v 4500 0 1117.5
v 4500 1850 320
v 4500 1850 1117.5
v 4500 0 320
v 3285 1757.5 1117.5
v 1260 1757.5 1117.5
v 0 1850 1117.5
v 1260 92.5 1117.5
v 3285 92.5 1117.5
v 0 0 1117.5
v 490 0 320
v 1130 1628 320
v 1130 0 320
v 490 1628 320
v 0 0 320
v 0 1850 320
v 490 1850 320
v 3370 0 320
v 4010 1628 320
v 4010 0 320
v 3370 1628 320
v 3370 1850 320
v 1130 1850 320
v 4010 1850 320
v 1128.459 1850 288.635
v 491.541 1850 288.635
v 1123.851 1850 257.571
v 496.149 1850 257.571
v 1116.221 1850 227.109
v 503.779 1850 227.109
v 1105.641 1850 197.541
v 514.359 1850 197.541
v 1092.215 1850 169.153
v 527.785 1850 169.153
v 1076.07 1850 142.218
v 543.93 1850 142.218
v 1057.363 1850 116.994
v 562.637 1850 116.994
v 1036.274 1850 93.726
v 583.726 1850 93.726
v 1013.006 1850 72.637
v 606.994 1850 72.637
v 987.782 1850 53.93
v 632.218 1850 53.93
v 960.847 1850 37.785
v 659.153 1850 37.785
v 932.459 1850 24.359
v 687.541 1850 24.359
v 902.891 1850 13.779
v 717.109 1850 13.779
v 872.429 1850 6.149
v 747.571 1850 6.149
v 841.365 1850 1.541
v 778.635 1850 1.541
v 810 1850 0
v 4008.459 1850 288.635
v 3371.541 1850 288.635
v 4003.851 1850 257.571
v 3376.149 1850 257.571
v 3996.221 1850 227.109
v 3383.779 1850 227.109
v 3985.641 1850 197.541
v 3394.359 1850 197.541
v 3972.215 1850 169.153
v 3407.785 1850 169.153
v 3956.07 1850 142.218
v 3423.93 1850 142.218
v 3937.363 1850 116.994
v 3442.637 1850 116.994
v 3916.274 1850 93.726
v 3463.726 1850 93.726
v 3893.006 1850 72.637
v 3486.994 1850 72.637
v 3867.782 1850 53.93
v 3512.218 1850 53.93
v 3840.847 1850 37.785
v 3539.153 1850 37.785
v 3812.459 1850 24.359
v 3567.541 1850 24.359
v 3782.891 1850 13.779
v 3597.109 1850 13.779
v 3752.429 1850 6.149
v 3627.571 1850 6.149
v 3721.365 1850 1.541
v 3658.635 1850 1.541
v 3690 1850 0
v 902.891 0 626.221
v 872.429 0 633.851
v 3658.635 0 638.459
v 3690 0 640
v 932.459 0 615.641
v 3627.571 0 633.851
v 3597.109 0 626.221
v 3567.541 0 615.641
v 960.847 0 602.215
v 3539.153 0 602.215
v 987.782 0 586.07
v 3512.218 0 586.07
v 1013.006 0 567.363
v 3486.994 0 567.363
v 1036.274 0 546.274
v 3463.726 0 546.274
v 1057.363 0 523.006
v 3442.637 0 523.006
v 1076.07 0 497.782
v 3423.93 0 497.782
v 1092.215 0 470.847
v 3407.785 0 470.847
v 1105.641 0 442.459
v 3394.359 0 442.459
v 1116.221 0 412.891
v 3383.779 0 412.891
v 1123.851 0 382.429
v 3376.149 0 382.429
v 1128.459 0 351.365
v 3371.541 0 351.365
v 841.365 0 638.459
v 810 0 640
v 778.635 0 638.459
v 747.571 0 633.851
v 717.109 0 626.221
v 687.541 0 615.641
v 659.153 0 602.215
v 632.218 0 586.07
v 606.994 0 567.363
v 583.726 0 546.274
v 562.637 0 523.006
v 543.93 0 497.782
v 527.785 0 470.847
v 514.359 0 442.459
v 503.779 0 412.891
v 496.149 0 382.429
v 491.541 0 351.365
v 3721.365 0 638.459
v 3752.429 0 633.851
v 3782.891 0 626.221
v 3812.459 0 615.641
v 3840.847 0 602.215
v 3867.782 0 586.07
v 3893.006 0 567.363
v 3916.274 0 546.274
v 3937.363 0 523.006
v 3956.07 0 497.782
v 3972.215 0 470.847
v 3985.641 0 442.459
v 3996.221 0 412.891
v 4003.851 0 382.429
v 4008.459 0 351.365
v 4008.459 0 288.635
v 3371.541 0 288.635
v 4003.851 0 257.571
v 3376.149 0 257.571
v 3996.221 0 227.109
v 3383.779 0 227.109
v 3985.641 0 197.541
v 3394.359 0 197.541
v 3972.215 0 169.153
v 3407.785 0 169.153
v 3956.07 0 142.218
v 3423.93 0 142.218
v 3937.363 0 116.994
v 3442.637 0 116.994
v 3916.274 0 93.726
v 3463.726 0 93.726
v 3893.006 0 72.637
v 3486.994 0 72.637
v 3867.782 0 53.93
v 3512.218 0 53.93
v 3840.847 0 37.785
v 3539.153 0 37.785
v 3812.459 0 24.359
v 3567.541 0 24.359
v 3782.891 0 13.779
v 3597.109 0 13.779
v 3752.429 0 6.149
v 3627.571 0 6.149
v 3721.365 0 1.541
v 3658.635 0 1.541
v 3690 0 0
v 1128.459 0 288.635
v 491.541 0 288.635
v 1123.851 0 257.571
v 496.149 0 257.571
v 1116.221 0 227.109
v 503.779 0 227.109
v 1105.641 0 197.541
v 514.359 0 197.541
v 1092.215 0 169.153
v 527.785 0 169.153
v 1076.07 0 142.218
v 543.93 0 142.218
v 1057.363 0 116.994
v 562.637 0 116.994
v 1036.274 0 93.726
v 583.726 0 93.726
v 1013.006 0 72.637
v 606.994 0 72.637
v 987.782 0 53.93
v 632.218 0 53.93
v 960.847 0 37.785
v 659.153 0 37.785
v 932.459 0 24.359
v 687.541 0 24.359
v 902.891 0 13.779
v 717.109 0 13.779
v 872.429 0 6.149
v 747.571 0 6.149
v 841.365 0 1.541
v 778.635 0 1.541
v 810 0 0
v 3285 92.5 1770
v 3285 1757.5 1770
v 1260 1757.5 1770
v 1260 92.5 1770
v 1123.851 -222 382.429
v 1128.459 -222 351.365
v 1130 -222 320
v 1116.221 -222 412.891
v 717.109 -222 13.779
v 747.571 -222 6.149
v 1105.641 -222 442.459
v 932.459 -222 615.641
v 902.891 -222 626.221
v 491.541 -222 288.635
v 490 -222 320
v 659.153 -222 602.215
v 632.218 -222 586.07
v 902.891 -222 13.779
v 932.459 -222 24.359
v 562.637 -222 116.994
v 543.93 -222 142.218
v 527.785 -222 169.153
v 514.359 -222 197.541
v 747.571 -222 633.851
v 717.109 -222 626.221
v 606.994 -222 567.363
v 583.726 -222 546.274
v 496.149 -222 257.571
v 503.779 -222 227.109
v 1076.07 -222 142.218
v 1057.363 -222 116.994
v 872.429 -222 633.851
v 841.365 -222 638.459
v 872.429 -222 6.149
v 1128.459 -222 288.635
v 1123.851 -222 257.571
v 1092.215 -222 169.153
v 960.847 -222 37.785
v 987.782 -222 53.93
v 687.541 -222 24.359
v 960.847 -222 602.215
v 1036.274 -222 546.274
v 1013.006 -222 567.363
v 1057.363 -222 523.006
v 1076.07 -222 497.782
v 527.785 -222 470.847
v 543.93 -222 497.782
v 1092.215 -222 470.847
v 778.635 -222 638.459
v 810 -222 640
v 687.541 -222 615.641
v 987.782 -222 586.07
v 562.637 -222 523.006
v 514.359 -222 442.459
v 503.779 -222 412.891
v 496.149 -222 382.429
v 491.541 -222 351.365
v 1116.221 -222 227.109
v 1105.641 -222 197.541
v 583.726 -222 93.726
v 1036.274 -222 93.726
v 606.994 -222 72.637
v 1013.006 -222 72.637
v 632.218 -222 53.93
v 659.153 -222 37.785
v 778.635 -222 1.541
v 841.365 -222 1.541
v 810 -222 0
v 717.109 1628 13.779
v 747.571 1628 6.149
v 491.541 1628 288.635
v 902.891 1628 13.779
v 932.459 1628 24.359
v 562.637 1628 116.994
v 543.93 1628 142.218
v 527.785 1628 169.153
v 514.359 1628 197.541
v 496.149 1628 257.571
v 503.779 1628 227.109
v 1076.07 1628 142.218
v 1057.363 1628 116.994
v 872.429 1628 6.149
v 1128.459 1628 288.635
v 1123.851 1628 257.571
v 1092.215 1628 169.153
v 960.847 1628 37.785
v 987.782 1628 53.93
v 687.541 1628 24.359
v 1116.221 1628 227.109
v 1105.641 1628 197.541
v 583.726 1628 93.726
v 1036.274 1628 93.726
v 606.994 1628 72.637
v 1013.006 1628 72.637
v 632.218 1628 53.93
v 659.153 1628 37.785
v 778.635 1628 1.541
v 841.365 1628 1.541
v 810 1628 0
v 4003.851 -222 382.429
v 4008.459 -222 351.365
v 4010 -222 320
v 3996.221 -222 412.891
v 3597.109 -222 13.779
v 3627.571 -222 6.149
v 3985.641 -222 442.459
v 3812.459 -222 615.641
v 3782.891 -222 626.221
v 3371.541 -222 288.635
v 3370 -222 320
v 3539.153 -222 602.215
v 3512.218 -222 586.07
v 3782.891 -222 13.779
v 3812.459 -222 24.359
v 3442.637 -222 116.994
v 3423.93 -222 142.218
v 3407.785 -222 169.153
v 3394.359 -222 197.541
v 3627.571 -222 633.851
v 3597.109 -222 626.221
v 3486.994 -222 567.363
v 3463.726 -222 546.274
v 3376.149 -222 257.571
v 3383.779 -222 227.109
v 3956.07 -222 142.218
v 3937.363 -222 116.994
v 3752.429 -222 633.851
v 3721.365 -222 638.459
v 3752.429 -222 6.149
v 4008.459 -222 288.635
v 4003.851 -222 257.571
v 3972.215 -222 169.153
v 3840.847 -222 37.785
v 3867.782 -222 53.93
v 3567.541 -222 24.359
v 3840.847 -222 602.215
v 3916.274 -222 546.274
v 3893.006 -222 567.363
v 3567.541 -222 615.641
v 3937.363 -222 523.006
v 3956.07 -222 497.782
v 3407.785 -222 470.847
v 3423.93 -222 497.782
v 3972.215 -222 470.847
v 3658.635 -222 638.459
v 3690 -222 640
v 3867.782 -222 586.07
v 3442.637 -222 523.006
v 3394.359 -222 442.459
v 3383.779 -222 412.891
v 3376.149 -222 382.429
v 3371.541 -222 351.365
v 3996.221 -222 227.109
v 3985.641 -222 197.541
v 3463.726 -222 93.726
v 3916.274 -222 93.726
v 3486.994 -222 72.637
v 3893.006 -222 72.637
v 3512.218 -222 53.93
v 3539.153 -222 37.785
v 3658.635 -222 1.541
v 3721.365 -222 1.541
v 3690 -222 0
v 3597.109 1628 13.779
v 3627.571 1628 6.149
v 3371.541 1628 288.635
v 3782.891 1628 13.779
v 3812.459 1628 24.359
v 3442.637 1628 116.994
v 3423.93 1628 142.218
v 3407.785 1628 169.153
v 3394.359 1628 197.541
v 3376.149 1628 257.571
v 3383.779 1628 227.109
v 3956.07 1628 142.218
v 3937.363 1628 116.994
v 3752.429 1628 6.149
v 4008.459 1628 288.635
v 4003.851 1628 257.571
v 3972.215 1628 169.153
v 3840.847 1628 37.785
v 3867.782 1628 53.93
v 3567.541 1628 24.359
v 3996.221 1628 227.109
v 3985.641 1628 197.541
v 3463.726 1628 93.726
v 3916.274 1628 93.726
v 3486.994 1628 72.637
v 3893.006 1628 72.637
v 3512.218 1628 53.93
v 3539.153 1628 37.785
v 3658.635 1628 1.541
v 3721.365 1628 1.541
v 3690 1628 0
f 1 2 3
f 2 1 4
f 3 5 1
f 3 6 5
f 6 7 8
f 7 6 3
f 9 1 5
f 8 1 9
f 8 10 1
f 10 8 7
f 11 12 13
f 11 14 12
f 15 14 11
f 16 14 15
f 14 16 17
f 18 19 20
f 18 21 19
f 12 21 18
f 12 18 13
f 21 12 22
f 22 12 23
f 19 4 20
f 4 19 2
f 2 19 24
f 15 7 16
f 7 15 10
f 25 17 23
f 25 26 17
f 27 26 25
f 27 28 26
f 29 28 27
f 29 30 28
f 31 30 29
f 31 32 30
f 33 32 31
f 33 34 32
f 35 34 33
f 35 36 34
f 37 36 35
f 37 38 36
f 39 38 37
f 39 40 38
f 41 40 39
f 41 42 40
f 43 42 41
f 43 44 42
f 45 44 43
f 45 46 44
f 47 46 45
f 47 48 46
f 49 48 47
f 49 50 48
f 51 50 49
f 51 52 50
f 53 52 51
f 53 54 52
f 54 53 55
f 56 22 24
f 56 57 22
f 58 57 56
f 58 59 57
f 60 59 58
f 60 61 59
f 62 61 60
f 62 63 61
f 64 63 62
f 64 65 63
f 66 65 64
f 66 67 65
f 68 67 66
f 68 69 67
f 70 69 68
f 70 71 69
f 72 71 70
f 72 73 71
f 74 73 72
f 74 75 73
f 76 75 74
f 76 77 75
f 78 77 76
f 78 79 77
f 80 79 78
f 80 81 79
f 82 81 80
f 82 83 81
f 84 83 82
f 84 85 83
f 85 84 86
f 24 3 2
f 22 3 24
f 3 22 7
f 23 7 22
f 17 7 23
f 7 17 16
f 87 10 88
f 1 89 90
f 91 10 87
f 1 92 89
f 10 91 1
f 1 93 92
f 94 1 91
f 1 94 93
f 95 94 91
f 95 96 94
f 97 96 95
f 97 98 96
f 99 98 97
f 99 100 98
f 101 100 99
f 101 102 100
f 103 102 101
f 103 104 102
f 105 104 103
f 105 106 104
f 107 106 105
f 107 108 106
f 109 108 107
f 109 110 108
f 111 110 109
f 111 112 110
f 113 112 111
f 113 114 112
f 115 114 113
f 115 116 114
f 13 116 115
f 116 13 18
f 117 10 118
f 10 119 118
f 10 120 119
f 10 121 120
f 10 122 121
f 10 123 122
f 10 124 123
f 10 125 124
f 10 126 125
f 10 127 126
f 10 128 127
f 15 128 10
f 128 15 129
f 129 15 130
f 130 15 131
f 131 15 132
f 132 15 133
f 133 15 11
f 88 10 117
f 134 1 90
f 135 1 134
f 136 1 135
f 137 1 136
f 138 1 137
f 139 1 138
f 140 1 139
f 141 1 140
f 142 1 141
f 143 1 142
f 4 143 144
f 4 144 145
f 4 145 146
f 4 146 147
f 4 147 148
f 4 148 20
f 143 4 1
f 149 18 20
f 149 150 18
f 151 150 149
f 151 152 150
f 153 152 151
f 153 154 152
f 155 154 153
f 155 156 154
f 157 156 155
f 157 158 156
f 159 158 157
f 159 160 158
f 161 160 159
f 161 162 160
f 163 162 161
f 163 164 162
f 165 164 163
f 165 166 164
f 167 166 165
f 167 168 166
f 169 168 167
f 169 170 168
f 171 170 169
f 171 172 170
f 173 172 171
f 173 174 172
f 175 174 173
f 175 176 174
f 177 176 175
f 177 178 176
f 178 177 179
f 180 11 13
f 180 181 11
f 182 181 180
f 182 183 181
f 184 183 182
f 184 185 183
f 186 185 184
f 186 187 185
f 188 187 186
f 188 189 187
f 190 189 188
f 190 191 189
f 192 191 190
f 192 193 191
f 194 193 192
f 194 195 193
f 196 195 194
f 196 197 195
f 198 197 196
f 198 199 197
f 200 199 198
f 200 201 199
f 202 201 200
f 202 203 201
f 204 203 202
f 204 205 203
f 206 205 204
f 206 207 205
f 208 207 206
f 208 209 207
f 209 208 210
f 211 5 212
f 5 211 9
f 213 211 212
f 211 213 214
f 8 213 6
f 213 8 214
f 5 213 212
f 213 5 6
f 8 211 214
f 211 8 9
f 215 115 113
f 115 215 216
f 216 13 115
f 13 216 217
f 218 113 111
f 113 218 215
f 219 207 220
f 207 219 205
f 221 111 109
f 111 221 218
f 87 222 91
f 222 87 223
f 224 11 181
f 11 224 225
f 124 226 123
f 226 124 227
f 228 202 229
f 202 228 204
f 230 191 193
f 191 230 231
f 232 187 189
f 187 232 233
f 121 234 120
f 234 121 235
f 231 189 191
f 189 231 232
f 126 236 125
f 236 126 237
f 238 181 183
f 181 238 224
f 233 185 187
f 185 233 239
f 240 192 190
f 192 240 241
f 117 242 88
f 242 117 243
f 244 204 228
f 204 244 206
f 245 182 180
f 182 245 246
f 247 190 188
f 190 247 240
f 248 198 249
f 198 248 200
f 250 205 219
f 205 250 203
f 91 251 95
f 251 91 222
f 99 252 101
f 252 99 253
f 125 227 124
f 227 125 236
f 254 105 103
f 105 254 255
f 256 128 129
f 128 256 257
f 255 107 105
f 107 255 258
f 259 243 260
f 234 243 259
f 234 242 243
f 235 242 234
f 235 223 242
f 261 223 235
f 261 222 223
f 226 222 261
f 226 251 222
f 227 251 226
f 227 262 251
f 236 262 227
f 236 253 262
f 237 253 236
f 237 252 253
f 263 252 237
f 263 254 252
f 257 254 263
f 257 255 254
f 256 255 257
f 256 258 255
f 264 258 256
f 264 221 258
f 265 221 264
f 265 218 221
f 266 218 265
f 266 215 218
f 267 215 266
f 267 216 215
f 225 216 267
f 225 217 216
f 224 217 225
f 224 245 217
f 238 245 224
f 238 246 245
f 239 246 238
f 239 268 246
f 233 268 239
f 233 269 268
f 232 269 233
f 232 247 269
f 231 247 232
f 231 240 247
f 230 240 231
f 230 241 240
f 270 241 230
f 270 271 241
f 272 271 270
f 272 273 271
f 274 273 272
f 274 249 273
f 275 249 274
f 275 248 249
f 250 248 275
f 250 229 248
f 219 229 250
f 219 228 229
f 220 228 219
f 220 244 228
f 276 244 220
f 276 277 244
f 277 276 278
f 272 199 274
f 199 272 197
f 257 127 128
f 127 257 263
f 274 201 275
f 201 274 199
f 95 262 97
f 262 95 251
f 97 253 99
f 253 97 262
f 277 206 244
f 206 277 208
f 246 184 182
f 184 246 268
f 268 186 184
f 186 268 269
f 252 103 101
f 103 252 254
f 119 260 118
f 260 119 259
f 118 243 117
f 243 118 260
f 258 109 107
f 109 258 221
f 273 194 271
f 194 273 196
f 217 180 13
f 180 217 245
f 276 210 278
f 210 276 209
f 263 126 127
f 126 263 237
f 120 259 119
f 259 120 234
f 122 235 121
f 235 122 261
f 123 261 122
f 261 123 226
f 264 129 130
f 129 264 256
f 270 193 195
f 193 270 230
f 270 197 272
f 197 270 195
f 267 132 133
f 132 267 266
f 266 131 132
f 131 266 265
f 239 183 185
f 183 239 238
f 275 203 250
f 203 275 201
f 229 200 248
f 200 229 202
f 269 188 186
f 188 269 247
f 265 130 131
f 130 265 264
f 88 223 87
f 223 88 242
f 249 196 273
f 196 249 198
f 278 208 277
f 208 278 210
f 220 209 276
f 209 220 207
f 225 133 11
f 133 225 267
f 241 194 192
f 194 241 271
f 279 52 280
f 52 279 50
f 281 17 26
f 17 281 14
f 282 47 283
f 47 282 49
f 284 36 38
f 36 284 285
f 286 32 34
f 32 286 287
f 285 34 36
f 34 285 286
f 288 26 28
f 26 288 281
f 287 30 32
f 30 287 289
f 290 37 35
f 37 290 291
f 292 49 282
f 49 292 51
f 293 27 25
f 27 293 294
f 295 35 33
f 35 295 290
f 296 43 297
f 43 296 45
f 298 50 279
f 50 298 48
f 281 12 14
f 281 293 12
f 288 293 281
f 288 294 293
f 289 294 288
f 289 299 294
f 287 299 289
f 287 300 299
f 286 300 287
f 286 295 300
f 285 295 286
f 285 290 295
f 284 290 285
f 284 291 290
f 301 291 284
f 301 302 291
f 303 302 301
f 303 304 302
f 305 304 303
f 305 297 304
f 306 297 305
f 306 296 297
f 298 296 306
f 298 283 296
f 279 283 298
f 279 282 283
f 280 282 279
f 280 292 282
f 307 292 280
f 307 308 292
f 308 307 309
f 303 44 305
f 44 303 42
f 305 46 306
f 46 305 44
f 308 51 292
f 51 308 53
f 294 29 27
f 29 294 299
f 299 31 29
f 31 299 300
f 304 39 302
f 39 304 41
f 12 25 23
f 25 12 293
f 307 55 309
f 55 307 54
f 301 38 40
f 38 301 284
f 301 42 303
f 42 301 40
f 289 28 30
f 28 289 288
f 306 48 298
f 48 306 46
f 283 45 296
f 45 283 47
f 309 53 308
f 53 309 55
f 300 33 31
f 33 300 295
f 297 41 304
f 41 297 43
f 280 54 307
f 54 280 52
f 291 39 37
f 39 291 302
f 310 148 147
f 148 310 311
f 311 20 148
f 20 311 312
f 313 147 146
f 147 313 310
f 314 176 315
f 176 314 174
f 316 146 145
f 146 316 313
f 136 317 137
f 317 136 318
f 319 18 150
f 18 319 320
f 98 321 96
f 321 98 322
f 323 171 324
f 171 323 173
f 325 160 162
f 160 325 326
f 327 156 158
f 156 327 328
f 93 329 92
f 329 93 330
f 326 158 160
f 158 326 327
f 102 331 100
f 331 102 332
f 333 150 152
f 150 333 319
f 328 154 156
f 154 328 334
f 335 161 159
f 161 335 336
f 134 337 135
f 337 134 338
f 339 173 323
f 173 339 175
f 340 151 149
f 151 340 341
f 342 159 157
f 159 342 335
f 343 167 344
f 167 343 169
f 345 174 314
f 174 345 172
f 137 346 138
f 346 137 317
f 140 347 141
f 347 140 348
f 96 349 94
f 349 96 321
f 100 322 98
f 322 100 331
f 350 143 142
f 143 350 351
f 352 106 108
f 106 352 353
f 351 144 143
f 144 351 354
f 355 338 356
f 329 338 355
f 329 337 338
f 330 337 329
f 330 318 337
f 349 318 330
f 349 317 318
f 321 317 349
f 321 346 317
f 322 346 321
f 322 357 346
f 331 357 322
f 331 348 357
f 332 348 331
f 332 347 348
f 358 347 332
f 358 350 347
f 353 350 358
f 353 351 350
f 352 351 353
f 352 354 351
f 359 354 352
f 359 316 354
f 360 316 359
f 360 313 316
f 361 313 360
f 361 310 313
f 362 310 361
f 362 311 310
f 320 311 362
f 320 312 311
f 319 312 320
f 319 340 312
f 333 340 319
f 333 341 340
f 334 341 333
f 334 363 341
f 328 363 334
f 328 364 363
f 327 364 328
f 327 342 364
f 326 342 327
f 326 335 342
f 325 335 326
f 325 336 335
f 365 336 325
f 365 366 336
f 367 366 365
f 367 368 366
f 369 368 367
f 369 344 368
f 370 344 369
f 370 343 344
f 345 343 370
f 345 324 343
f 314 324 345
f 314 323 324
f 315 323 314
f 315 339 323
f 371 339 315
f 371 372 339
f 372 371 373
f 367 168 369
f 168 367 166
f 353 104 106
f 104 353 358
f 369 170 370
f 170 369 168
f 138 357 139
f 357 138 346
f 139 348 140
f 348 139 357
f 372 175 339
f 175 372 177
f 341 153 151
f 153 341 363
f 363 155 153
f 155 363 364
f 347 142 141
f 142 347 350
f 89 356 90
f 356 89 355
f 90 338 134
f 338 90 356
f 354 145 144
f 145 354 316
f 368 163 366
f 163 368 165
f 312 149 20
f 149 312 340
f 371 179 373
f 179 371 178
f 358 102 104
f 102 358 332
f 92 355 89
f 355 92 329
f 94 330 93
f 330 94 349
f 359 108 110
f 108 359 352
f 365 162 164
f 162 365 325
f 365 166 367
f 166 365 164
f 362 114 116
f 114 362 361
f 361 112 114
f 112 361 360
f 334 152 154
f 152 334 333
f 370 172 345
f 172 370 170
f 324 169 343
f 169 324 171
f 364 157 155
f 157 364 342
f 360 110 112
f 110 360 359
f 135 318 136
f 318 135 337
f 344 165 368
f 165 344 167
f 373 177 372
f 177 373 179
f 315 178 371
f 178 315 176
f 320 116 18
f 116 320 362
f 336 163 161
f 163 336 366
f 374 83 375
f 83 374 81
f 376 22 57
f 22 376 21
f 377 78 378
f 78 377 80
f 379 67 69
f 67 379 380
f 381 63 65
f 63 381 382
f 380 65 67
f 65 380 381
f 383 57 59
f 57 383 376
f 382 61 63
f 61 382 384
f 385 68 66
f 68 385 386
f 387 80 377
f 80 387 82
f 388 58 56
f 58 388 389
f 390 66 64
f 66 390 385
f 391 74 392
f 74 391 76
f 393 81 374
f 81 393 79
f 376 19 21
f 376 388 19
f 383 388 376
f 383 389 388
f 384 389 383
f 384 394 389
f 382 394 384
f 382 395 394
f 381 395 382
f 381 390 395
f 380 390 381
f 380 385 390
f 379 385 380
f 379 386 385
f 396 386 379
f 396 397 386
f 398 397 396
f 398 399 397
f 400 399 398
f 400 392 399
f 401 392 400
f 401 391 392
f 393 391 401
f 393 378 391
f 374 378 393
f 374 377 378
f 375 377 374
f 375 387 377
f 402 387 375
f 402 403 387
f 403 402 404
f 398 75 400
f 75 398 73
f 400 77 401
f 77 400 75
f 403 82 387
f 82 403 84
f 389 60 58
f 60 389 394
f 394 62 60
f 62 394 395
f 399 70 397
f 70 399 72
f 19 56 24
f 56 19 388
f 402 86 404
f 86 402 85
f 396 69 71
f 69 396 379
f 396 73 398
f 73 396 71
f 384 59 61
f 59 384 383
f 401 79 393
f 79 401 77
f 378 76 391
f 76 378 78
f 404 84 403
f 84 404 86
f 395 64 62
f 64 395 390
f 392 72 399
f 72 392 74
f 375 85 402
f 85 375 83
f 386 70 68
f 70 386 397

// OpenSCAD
// Generated by Text-to-CAD from prompt:
// a 4.5 m long sedan, 1.85 m wide
$fn = 64;

module Car() {
    translate([0, 0, 320]) {
    cube([4500, 1850, 797.5]);
    }
    translate([1260, 92.5, 1117.5]) {
    cube([2025, 1665, 652.5]);
    }
    translate([810, 0, 320]) rotate(a=90, v=[1, 0, 0]) {
    cylinder(h=222, r=320, $fn=$fn);
    }
    translate([810, 1850, 320]) rotate(a=90, v=[1, 0, 0]) {
    cylinder(h=222, r=320, $fn=$fn);
    }
    translate([3690, 0, 320]) rotate(a=90, v=[1, 0, 0]) {
    cylinder(h=222, r=320, $fn=$fn);
    }
    translate([3690, 1850, 320]) rotate(a=90, v=[1, 0, 0]) {
    cylinder(h=222, r=320, $fn=$fn);
    }
}

Car();
